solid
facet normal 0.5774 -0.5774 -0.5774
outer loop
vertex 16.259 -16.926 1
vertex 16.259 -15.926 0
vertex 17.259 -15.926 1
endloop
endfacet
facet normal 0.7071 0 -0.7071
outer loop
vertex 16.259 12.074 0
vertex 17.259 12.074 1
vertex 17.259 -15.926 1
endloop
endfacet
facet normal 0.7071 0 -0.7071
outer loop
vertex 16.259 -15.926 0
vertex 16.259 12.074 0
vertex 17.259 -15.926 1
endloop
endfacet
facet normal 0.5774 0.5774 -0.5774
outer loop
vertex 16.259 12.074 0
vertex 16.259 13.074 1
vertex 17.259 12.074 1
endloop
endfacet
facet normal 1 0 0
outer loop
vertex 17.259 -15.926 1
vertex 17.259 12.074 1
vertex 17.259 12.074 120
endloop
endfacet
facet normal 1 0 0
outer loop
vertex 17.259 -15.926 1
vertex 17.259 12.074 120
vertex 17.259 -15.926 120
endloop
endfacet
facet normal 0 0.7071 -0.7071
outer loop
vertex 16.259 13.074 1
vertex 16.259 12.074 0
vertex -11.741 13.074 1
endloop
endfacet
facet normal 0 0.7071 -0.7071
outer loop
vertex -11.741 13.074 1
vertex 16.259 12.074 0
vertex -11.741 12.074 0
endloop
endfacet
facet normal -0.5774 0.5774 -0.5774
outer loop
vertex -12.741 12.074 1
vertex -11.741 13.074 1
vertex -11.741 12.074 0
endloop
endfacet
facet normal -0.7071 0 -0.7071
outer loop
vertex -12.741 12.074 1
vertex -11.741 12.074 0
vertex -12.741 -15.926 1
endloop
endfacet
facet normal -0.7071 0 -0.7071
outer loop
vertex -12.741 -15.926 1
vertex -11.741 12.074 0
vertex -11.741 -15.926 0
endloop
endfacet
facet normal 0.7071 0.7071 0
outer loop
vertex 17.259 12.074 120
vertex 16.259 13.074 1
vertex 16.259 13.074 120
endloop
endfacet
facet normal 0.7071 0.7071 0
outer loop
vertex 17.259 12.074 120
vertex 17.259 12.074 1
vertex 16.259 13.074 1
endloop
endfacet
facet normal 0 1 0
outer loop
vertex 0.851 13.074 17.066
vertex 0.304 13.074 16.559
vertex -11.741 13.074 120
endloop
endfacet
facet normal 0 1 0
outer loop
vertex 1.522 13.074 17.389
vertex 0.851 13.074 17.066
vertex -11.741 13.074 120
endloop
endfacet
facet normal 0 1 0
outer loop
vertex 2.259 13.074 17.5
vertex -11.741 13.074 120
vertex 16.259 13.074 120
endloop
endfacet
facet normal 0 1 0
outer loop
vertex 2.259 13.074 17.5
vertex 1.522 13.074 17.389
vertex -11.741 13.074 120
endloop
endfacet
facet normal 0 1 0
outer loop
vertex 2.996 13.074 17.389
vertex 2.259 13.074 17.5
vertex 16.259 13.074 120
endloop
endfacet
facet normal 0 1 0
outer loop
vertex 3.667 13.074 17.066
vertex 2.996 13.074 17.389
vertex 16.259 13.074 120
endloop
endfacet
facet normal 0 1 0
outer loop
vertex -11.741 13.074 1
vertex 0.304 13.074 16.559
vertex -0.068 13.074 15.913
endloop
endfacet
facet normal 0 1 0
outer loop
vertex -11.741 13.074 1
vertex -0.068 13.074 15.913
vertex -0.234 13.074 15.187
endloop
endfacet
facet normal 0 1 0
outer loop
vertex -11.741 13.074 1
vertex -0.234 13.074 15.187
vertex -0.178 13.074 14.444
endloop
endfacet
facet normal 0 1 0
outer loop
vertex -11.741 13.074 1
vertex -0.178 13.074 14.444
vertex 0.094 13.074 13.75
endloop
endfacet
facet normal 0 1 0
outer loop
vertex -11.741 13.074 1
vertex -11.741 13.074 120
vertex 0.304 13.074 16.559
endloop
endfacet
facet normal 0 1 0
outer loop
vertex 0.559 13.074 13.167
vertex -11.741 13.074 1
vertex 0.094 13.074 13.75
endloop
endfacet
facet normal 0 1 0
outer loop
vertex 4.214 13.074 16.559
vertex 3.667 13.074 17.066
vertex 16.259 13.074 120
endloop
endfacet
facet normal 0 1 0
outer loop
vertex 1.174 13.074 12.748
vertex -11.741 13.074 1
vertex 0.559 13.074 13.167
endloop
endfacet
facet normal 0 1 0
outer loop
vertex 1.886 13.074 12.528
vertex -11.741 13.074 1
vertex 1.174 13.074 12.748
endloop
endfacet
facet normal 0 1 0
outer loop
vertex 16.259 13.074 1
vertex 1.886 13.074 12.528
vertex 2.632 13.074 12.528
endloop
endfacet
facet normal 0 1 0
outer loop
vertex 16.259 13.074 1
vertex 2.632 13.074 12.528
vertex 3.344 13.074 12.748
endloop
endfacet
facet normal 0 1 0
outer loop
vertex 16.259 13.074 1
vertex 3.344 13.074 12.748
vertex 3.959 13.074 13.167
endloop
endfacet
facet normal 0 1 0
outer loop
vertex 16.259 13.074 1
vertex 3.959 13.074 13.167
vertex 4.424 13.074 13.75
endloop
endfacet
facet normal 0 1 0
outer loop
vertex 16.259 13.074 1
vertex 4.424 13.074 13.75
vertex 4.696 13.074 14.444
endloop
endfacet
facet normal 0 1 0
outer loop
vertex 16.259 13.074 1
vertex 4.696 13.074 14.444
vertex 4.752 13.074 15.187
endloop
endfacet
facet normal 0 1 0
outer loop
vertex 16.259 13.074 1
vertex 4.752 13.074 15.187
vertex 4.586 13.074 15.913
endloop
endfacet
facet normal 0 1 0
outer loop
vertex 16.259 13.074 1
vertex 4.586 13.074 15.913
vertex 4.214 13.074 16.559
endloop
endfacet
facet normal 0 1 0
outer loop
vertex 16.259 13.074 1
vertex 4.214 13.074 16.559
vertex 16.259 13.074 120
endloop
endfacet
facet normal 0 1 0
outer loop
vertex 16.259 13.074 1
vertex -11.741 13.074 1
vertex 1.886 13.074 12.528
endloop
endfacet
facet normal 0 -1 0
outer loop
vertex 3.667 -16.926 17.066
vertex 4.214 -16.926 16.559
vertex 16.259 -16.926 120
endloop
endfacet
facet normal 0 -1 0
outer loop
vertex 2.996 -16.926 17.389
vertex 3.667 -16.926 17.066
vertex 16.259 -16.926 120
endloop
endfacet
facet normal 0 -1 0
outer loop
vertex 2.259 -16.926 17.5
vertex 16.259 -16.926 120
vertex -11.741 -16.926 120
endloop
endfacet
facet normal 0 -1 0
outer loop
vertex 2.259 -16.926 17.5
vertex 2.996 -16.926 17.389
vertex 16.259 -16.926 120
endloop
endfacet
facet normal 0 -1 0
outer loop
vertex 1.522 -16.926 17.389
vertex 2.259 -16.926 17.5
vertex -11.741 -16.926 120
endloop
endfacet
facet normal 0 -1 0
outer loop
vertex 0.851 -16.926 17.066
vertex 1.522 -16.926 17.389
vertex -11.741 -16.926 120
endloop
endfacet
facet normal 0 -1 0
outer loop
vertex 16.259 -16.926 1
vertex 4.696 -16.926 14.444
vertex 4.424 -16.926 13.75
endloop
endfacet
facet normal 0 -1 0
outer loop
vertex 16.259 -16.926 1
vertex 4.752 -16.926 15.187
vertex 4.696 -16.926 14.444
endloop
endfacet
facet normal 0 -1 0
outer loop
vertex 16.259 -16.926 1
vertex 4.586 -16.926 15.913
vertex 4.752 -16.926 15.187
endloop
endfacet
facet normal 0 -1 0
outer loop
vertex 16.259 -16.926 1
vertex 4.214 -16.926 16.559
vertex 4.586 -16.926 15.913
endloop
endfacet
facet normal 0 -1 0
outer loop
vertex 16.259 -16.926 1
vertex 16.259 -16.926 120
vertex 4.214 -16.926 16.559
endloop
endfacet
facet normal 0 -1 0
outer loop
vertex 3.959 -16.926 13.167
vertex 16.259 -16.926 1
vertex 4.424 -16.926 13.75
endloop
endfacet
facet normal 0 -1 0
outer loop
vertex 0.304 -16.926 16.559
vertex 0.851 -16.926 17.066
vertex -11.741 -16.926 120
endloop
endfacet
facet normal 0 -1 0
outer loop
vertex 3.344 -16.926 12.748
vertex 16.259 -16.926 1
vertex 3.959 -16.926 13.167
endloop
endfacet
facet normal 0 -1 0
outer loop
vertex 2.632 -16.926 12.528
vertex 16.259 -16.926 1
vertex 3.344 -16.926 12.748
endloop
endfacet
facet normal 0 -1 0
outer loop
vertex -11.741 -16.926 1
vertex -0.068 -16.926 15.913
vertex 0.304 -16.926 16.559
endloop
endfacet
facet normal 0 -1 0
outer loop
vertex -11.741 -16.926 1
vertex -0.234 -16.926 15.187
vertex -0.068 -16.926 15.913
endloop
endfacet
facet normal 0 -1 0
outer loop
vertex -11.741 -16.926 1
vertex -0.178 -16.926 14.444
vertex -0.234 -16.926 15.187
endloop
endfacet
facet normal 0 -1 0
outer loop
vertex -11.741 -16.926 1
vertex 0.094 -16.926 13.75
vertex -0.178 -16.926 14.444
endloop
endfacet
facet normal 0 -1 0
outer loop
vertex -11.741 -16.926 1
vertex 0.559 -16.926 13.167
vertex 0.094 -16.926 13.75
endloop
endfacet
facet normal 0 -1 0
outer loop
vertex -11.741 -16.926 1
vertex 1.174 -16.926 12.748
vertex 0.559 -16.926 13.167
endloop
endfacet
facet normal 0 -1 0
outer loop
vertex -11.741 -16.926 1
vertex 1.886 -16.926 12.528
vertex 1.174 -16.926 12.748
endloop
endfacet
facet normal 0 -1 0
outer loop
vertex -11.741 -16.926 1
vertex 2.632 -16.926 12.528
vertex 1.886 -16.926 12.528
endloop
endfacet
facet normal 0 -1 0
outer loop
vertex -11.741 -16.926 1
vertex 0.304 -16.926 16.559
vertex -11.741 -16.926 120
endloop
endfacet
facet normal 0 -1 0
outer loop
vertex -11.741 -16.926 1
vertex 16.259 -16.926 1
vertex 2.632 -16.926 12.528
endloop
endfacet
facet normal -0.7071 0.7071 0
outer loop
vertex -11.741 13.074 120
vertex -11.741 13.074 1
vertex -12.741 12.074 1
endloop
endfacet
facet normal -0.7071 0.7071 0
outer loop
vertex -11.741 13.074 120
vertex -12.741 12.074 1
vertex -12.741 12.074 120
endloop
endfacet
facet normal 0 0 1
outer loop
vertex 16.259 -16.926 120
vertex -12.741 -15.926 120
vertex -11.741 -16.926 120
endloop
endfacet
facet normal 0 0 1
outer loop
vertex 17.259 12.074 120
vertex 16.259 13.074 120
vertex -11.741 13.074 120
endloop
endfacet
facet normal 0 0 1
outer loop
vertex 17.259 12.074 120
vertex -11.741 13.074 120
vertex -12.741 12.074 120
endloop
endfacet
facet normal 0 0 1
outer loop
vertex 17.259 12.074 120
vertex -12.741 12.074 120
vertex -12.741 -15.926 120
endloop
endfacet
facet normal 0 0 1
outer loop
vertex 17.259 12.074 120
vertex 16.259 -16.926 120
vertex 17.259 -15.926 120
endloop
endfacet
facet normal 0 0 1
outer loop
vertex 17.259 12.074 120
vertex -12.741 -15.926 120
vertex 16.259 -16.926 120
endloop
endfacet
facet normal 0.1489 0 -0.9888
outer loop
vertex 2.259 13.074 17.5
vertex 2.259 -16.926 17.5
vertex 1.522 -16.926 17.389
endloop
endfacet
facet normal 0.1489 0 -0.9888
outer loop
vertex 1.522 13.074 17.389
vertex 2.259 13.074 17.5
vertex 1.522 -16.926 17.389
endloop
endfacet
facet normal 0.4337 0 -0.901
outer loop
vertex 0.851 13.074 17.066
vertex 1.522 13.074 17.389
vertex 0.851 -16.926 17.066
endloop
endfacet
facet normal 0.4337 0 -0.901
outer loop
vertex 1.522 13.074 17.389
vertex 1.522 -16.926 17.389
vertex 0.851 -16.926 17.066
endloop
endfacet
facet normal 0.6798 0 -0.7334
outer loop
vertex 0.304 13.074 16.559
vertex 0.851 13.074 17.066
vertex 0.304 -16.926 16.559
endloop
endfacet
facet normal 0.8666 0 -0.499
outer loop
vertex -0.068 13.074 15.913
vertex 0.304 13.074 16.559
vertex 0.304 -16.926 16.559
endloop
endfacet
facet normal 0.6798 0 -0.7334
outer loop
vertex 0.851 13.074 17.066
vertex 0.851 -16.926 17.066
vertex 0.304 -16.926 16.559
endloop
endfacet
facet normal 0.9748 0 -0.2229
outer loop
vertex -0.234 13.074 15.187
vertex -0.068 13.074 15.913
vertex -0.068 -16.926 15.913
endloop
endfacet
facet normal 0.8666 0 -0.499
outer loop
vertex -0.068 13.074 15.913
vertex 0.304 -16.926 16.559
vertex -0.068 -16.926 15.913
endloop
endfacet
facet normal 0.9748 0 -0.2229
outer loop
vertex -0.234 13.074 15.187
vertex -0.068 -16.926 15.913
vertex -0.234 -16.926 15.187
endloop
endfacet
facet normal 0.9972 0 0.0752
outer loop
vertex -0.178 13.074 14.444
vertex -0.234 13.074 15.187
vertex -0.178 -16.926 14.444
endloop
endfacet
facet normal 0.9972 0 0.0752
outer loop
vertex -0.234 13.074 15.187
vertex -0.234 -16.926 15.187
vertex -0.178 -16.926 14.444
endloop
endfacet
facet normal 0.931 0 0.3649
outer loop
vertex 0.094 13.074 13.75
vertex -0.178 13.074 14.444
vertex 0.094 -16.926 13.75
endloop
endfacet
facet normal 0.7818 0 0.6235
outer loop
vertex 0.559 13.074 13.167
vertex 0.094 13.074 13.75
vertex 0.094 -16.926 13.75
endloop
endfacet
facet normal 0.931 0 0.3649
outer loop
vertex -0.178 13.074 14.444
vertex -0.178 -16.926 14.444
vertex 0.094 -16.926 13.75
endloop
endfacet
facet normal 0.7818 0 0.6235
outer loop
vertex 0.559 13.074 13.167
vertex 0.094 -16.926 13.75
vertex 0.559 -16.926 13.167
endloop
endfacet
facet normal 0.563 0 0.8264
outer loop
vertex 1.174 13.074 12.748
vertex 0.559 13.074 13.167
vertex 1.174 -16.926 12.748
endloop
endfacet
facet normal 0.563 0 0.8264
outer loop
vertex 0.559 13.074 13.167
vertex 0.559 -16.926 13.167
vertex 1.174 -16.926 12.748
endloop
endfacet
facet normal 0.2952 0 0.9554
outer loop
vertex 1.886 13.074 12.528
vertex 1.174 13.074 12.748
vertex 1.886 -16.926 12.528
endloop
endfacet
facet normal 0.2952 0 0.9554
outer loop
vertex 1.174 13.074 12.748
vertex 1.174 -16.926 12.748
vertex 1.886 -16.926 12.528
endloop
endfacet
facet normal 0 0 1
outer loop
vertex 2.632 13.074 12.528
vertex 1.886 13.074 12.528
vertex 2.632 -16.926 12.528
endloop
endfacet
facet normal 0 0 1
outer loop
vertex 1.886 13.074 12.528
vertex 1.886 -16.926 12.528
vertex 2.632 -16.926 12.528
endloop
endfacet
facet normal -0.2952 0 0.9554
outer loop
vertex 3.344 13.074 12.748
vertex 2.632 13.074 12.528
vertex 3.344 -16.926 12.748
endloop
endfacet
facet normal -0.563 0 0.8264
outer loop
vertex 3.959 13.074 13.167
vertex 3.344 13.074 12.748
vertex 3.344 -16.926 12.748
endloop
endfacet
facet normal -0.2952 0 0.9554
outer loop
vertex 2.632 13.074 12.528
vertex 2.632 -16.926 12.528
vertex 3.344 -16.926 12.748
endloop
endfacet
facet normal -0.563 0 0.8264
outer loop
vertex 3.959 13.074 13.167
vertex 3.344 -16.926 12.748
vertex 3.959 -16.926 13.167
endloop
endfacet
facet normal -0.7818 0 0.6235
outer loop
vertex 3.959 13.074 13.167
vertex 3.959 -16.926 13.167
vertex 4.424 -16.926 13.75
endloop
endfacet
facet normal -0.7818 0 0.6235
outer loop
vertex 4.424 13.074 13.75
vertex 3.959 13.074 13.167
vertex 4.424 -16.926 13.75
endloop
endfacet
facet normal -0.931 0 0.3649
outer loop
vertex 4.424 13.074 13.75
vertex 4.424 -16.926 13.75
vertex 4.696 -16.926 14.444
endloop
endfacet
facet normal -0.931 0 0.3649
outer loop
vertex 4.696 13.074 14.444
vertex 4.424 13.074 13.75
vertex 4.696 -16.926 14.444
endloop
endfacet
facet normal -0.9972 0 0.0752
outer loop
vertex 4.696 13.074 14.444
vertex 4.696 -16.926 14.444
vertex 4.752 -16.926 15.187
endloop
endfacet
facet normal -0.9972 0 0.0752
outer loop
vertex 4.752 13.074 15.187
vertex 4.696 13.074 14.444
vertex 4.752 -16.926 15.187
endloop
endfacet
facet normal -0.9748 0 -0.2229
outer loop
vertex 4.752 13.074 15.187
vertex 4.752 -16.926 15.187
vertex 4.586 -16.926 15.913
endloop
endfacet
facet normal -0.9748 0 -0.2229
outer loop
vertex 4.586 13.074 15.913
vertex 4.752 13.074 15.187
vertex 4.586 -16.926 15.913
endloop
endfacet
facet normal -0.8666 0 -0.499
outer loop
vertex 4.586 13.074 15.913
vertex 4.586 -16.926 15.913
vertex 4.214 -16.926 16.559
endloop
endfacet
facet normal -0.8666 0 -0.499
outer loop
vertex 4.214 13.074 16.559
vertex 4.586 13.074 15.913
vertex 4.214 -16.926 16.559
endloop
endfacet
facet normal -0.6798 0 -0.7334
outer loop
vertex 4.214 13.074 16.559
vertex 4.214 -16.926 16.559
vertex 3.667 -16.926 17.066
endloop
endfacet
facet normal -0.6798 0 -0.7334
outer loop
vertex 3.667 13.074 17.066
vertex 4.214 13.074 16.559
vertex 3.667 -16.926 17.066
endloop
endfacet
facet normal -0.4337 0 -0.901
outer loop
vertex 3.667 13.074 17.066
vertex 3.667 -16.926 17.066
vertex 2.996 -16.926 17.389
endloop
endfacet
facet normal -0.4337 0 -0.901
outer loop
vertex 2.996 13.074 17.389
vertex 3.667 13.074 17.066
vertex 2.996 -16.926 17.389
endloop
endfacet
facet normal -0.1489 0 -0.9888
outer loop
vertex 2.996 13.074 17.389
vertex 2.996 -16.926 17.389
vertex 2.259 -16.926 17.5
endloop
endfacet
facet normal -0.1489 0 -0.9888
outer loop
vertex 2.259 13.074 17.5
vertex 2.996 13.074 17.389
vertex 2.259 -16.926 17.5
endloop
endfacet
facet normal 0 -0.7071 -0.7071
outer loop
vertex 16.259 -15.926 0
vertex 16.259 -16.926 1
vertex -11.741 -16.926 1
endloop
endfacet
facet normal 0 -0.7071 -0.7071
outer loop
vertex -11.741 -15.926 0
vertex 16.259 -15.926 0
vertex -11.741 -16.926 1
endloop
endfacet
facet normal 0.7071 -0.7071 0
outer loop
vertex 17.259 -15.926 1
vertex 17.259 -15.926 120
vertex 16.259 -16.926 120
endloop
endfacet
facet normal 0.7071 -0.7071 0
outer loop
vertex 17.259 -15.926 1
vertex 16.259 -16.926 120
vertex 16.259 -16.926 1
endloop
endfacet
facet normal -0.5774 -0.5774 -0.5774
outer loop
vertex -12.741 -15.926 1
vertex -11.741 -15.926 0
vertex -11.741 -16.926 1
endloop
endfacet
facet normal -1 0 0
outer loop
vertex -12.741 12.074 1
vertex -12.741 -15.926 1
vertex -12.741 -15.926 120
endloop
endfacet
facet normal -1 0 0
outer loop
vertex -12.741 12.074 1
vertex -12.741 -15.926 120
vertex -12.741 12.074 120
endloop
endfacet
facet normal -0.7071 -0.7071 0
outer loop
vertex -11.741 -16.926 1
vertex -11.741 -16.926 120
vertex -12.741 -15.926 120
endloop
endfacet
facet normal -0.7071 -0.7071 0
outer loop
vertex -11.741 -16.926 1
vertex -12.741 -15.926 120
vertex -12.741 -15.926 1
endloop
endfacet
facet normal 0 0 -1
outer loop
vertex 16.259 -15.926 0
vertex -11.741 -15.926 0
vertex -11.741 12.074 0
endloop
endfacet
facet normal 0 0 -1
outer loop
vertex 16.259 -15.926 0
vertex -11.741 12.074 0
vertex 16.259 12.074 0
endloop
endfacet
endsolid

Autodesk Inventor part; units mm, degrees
ref_plane "YZ Plane" through (0, 0, 0) normal (1, 0, 0) x (0, 1, 0)
ref_plane "XZ Plane" through (0, 0, 0) normal (0, 1, 0) x (-1, 0, 0)
ref_plane "XY Plane" through (0, 0, 0) normal (0, 0, 1) x (1, 0, 0)
sketch "Skizze1" plane through (0, 0, 0) normal (0, 0, 1) x (1, 0, 0)
  line L0 (-18.741, 0) -> (23.259, 0) projected
  line L1 (0, -22.9262) -> (0, 19.0738) projected
  line L2 (-12.741, 13.0738) -> (17.259, 13.0738)
  line L3 (17.259, 13.0738) -> (17.259, -16.9262)
  line L4 (17.259, -16.9262) -> (-12.741, -16.9262)
  line L5 (-12.741, -16.9262) -> (-12.741, 13.0738)
  point P0 (0, 0)
  dimension "d0" = 30
  dimension "d1" = 30
extrude "Extrusion1" add sketch "Skizze1" along normal blind 120
sketch "Skizze2" plane through (-12.741, 13.0738, 0) normal (0, 1, 0) x (1, 0, 0)
  line L0 (0, 0) -> (0, -120) projected
  line L1 (30, 0) -> (0, 0) projected
  point P0 (12.741, 0)
  point P1 (15, -15)
  dimension "d4" = 15
  dimension "d5" = 15
hole "Bohrung1" at (2.259, 13.0738, 15) direction (0, -1, 0) diameter 5 end through all
chamfer "Fase1" distance 1 angle 45 8 edges at (17.259, 13.0738, 60) (-12.741, 13.0738, 60) (2.259, 13.0738, 0) (17.259, -1.9262, 0) (2.259, -16.9262, 0) (-12.741, -1.9262, 0) (17.259, -16.9262, 60) (-12.741, -16.9262, 60)
properties part number "Stütze mitte"
